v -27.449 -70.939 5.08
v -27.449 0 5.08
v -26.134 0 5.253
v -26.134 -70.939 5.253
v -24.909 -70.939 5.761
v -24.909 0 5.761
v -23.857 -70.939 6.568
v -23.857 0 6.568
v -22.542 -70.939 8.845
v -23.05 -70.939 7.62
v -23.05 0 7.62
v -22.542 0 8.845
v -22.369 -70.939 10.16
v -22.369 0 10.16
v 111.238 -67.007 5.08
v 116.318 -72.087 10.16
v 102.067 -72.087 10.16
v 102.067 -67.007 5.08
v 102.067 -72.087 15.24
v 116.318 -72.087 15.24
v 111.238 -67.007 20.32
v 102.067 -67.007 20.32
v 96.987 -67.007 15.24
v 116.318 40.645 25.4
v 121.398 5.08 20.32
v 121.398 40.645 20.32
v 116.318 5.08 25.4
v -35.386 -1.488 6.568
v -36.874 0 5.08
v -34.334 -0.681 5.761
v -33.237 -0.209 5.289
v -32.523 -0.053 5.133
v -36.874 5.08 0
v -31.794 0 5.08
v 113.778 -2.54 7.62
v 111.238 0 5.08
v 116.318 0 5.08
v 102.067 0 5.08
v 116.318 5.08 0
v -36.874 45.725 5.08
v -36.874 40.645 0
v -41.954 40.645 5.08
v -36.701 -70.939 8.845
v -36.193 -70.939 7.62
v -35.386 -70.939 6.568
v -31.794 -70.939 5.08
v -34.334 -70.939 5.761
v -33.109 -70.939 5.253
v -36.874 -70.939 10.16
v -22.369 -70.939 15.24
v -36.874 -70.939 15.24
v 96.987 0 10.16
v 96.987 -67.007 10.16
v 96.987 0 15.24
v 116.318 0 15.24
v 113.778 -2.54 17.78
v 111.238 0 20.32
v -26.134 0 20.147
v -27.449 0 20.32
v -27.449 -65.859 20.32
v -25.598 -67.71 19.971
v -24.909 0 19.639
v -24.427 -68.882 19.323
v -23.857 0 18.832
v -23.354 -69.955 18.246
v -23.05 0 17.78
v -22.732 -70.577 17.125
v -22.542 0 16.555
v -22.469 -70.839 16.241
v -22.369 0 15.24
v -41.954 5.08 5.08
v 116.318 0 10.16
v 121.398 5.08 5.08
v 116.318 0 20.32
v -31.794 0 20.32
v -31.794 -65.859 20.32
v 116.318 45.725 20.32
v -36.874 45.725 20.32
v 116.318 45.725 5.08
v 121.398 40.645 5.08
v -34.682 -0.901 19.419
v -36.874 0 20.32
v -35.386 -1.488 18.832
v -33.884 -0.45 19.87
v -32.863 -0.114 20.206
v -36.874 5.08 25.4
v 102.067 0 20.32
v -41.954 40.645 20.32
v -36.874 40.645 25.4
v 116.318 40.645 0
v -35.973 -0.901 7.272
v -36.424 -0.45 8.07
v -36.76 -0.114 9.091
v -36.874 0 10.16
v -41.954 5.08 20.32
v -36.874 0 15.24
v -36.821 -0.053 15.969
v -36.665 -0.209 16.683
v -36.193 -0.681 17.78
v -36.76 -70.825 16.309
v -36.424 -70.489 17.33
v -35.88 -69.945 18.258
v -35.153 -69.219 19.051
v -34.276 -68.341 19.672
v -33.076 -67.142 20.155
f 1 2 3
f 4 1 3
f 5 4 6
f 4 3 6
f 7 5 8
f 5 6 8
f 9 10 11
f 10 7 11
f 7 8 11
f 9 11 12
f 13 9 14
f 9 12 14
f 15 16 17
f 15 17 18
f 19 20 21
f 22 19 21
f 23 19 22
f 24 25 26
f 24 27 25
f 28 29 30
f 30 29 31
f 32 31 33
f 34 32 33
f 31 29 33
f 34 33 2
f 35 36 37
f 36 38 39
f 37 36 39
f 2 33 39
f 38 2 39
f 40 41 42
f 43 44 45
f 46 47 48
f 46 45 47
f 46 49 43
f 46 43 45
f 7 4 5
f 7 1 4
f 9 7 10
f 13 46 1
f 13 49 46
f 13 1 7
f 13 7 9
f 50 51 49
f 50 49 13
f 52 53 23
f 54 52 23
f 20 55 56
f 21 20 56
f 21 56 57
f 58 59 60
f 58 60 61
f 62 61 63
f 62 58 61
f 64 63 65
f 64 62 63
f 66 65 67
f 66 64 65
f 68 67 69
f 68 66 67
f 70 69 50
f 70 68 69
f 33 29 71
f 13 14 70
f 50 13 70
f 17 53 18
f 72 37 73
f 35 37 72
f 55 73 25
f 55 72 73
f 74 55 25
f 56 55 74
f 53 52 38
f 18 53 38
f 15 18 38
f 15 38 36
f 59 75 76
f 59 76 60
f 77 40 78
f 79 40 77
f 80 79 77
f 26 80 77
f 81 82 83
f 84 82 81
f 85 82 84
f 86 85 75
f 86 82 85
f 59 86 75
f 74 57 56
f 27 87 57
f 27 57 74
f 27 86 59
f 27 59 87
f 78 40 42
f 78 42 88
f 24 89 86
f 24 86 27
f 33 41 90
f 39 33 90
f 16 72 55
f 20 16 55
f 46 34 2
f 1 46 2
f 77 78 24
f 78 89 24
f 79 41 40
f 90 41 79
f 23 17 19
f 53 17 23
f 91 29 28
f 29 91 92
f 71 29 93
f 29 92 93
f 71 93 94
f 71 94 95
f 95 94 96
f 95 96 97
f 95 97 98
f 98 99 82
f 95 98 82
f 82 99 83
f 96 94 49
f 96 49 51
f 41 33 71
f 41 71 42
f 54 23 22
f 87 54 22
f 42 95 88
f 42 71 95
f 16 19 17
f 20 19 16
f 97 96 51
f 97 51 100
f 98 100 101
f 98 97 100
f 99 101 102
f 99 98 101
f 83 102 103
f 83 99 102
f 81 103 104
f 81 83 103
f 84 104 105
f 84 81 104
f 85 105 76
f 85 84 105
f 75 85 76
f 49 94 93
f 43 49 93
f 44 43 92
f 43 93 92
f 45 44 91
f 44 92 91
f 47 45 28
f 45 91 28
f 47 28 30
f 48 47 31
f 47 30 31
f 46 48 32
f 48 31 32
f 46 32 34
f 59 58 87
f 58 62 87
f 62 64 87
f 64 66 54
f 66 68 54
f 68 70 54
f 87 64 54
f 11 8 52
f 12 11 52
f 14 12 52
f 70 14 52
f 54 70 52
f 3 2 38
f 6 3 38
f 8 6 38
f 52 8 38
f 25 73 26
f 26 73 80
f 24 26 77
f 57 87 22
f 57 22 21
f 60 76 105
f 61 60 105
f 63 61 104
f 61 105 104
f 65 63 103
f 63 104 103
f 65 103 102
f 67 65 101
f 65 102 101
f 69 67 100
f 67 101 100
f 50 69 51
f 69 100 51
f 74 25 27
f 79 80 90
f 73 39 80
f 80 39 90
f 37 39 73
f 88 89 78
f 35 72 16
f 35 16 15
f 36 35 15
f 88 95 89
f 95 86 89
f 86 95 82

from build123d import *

# Parameters (mm, degrees)
F0_W         = 163.3519083261
F0_H         = 45.7251667976
F1_DEPTH     = 25.4
F2_SIZE      = 5.08
F3_W         = 14.5046669376
F3_H         = 15.24
F4_DEPTH     = 70.9391236305
F5_W         = 19.3313653898
F5_H         = 15.24
F6_DEPTH     = 72.0867142081
F7_T1_DEPTH  = 39.9046669376
F7_T6_DEPTH  = 96.3391236305
F7_T12_DEPTH = 96.3391236305
F7_T18_DEPTH = 96.3391236305
F7_T24_DEPTH = 83.6391236305
F7_T29_DEPTH = 83.6391236305
F7_T34_DEPTH = 83.6391236305
F7_T39_DEPTH = 83.6391236305
F7_T44_DEPTH = 96.3391236305
F7_T50_DEPTH = 96.3391236305
F7_T56_DEPTH = 96.3391236305
F8_T1_DEPTH  = 6.4524666085
F8_T3_DEPTH  = 6.4524666085
F8_T5_DEPTH  = 85.150863787
F8_T7_DEPTH  = 45.4596645476
F8_T9_DEPTH  = 41.3682991577
F8_T14_DEPTH = 98.2150133659
F8_T19_DEPTH = 98.2150133659
F8_T24_DEPTH = 98.2150133659
F8_T29_DEPTH = 98.2150133659


# Not quite as in the source:
# - a fillet or chamfer that OpenCascade refuses, or shapes differently, is made with other operations: its cross-section is extruded or revolved along the edge and cut away or added


with BuildPart() as f1:
    # F0 (on Top) → F1 (new body)
    with BuildSketch(Plane.XY):
        with Locations((39.7221744061, 22.8625833988)):
            Rectangle(F0_W, F0_H)
    extrude(amount=F1_DEPTH)

    # F2
    f2_edges = [f1.edges().sort_by_distance(p)[0] for p in [
        (121.398129, 22.862583, 25.4),
        (121.398129, 22.862583, 0),
        (39.722174, 0, 0),
        (121.398129, 0, 12.7),
        (121.398129, 45.725167, 12.7),
        (39.722174, 45.725167, 0),
        (39.722174, 45.725167, 25.4),
        (-41.95378, 22.862583, 25.4),
        (-41.95378, 0, 12.7),
        (-41.95378, 22.862583, 0),
        (-41.95378, 45.725167, 12.7),
        (39.722174, 0, 25.4),
    ]]
    chamfer(f2_edges, length=F2_SIZE)

    # F3 (on face) → F4 (join)
    with BuildSketch(Plane.XZ):
        with Locations((-29.6214462882, 12.7)):
            Rectangle(F3_W, F3_H)
    extrude(amount=F4_DEPTH)

    # F5 (on face) → F6 (join)
    with BuildSketch(Plane.XZ):
        with Locations((106.6524458742, 12.7)):
            Rectangle(F5_W, F5_H)
    extrude(amount=F6_DEPTH)

    # F7: fillet of radius 5.08 on 5 edges, made by hand

    # F7_s2 → F7_t1 (cut)
    with BuildSketch(Plane.YZ.offset(-49.573779757)):
        with BuildLine():
            ThreePointArc((-65.8591236305, 20.32), (-69.451226079, 18.8321024484), (-70.9391236305, 15.24))
            Line((-70.9391236305, 15.24), (-70.9391236305, 20.32))
            Line((-70.9391236305, 20.32), (-65.8591236305, 20.32))
        make_face()
    extrude(amount=F7_T1_DEPTH, mode=Mode.SUBTRACT)


with BuildPart() as f7_tool4:
    # F7_s5 → F7_t6 (new body)
    with BuildSketch(Plane.XZ.offset(-12.7)):
        with BuildLine():
            ThreePointArc((-36.873779757, 15.24), (-35.3858822055, 18.8321024484), (-31.793779757, 20.32))
            Line((-31.793779757, 20.32), (-36.873779757, 20.32))
            Line((-36.873779757, 20.32), (-36.873779757, 15.24))
        make_face()
    extrude(amount=F7_T6_DEPTH)

    split(bisect_by=Plane(origin=(-18.4368898785, -18.4368898785, 0), x_dir=(0, 0, 1), z_dir=(0.7071067812, 0.7071067812, 0)), keep=Keep.TOP)

    split(bisect_by=Plane(origin=(0, -10.16, 10.16), x_dir=(1, 0, 0), z_dir=(0, -0.7071067812, 0.7071067812)), keep=Keep.TOP)


with BuildPart() as f1_1:
    add(f1.part)

    # F7_t3: cut F7_tool4
    add(f7_tool4.part, mode=Mode.SUBTRACT)


with BuildPart() as f7_tool10:
    # F7_s11 → F7_t12 (new body)
    with BuildSketch(Plane.XZ.offset(-12.7)):
        with BuildLine():
            ThreePointArc((-36.873779757, 15.24), (-35.3858822055, 18.8321024484), (-31.793779757, 20.32))
            Line((-31.793779757, 20.32), (-36.873779757, 20.32))
            Line((-36.873779757, 20.32), (-36.873779757, 15.24))
        make_face()
    extrude(amount=F7_T12_DEPTH)

    split(bisect_by=Plane(origin=(-18.4368898785, -18.4368898785, 0), x_dir=(0, 0, 1), z_dir=(-0.7071067812, -0.7071067812, 0)), keep=Keep.TOP)

    split(bisect_by=Plane(origin=(0, -10.16, 10.16), x_dir=(1, 0, 0), z_dir=(0, 0.7071067812, -0.7071067812)), keep=Keep.TOP)


with BuildPart() as f1_2:
    add(f1_1.part)

    # F7_t9: cut F7_tool10
    add(f7_tool10.part, mode=Mode.SUBTRACT)


with BuildPart() as f7_tool16:
    # F7_s17 → F7_t18 (new body)
    with BuildSketch(Plane.XZ.offset(-12.7)):
        with BuildLine():
            ThreePointArc((-36.873779757, 15.24), (-35.3858822055, 18.8321024484), (-31.793779757, 20.32))
            Line((-31.793779757, 20.32), (-36.873779757, 20.32))
            Line((-36.873779757, 20.32), (-36.873779757, 15.24))
        make_face()
    extrude(amount=F7_T18_DEPTH)

    split(bisect_by=Plane(origin=(-18.4368898785, -18.4368898785, 0), x_dir=(0, 0, 1), z_dir=(-0.7071067812, -0.7071067812, 0)), keep=Keep.TOP)

    split(bisect_by=Plane(origin=(0, -10.16, 10.16), x_dir=(1, 0, 0), z_dir=(0, -0.7071067812, 0.7071067812)), keep=Keep.TOP)


with BuildPart() as f1_3:
    add(f1_2.part)

    # F7_t15: cut F7_tool16
    add(f7_tool16.part, mode=Mode.SUBTRACT)


with BuildPart() as f7_tool22:
    # F7_s23 → F7_t24 (new body)
    with BuildSketch(Plane.XZ):
        with BuildLine():
            ThreePointArc((-27.4491128194, 5.08), (-23.857010371, 6.5678975516), (-22.3691128194, 10.16))
            Line((-22.3691128194, 10.16), (-22.3691128194, 5.08))
            Line((-22.3691128194, 5.08), (-27.4491128194, 5.08))
        make_face()
    extrude(amount=F7_T24_DEPTH)

    split(bisect_by=Plane(origin=(0, 2.54, 2.54), x_dir=(1, 0, 0), z_dir=(0, 0.7071067812, 0.7071067812)), keep=Keep.TOP)


with BuildPart() as f1_4:
    add(f1_3.part)

    # F7_t21: cut F7_tool22
    add(f7_tool22.part, mode=Mode.SUBTRACT)


with BuildPart() as f7_tool27:
    # F7_s28 → F7_t29 (new body)
    with BuildSketch(Plane.XZ):
        with BuildLine():
            ThreePointArc((-27.4491128194, 5.08), (-23.857010371, 6.5678975516), (-22.3691128194, 10.16))
            Line((-22.3691128194, 10.16), (-22.3691128194, 5.08))
            Line((-22.3691128194, 5.08), (-27.4491128194, 5.08))
        make_face()
    extrude(amount=F7_T29_DEPTH)

    split(bisect_by=Plane(origin=(0, 2.54, 2.54), x_dir=(1, 0, 0), z_dir=(0, -0.7071067812, -0.7071067812)), keep=Keep.TOP)


with BuildPart() as f1_5:
    add(f1_4.part)

    # F7_t26: cut F7_tool27
    add(f7_tool27.part, mode=Mode.SUBTRACT)


with BuildPart() as f7_tool32:
    # F7_s33 → F7_t34 (new body)
    with BuildSketch(Plane.XZ):
        with BuildLine():
            ThreePointArc((-27.4491128194, 20.32), (-23.857010371, 18.8321024484), (-22.3691128194, 15.24))
            Line((-22.3691128194, 15.24), (-22.3691128194, 20.32))
            Line((-22.3691128194, 20.32), (-27.4491128194, 20.32))
        make_face()
    extrude(amount=F7_T34_DEPTH)

    split(bisect_by=Plane(origin=(0, -10.16, 10.16), x_dir=(1, 0, 0), z_dir=(0, 0.7071067812, -0.7071067812)), keep=Keep.TOP)


with BuildPart() as f1_6:
    add(f1_5.part)

    # F7_t31: cut F7_tool32
    add(f7_tool32.part, mode=Mode.SUBTRACT)


with BuildPart() as f7_tool37:
    # F7_s38 → F7_t39 (new body)
    with BuildSketch(Plane.XZ):
        with BuildLine():
            ThreePointArc((-27.4491128194, 20.32), (-23.857010371, 18.8321024484), (-22.3691128194, 15.24))
            Line((-22.3691128194, 15.24), (-22.3691128194, 20.32))
            Line((-22.3691128194, 20.32), (-27.4491128194, 20.32))
        make_face()
    extrude(amount=F7_T39_DEPTH)

    split(bisect_by=Plane(origin=(0, -10.16, 10.16), x_dir=(1, 0, 0), z_dir=(0, -0.7071067812, 0.7071067812)), keep=Keep.TOP)


with BuildPart() as f1_7:
    add(f1_6.part)

    # F7_t36: cut F7_tool37
    add(f7_tool37.part, mode=Mode.SUBTRACT)


with BuildPart() as f7_tool42:
    # F7_s43 → F7_t44 (new body)
    with BuildSketch(Plane.XZ.offset(-12.7)):
        with BuildLine():
            ThreePointArc((-36.873779757, 10.16), (-35.3858822055, 6.5678975516), (-31.793779757, 5.08))
            Line((-31.793779757, 5.08), (-36.873779757, 5.08))
            Line((-36.873779757, 5.08), (-36.873779757, 10.16))
        make_face()
    extrude(amount=F7_T44_DEPTH)

    split(bisect_by=Plane(origin=(-18.4368898785, -18.4368898785, 0), x_dir=(0, 0, 1), z_dir=(0.7071067812, 0.7071067812, 0)), keep=Keep.TOP)

    split(bisect_by=Plane(origin=(0, 2.54, 2.54), x_dir=(1, 0, 0), z_dir=(0, -0.7071067812, -0.7071067812)), keep=Keep.TOP)


with BuildPart() as f1_8:
    add(f1_7.part)

    # F7_t41: cut F7_tool42
    add(f7_tool42.part, mode=Mode.SUBTRACT)


with BuildPart() as f7_tool48:
    # F7_s49 → F7_t50 (new body)
    with BuildSketch(Plane.XZ.offset(-12.7)):
        with BuildLine():
            ThreePointArc((-36.873779757, 10.16), (-35.3858822055, 6.5678975516), (-31.793779757, 5.08))
            Line((-31.793779757, 5.08), (-36.873779757, 5.08))
            Line((-36.873779757, 5.08), (-36.873779757, 10.16))
        make_face()
    extrude(amount=F7_T50_DEPTH)

    split(bisect_by=Plane(origin=(-18.4368898785, -18.4368898785, 0), x_dir=(0, 0, 1), z_dir=(-0.7071067812, -0.7071067812, 0)), keep=Keep.TOP)

    split(bisect_by=Plane(origin=(0, 2.54, 2.54), x_dir=(1, 0, 0), z_dir=(0, 0.7071067812, 0.7071067812)), keep=Keep.TOP)


with BuildPart() as f1_9:
    add(f1_8.part)

    # F7_t47: cut F7_tool48
    add(f7_tool48.part, mode=Mode.SUBTRACT)


with BuildPart() as f7_tool54:
    # F7_s55 → F7_t56 (new body)
    with BuildSketch(Plane.XZ.offset(-12.7)):
        with BuildLine():
            ThreePointArc((-36.873779757, 10.16), (-35.3858822055, 6.5678975516), (-31.793779757, 5.08))
            Line((-31.793779757, 5.08), (-36.873779757, 5.08))
            Line((-36.873779757, 5.08), (-36.873779757, 10.16))
        make_face()
    extrude(amount=F7_T56_DEPTH)

    split(bisect_by=Plane(origin=(-18.4368898785, -18.4368898785, 0), x_dir=(0, 0, 1), z_dir=(-0.7071067812, -0.7071067812, 0)), keep=Keep.TOP)

    split(bisect_by=Plane(origin=(0, 2.54, 2.54), x_dir=(1, 0, 0), z_dir=(0, -0.7071067812, -0.7071067812)), keep=Keep.TOP)


with BuildPart() as f1_10:
    add(f1_9.part)

    # F7_t53: cut F7_tool54
    add(f7_tool54.part, mode=Mode.SUBTRACT)

    # F8: chamfer of 5.08 on 7 edges, made by hand

    # F8_s2 → F8_t1 (cut)
    with BuildSketch(Plane(origin=(4.9133496571, 4.9133496571, -4.9133496571), x_dir=(0.7071067812, -0.7071067812, 0), z_dir=(-0.5773502692, -0.5773502692, 0.5773502692))):
        Polygon((119.5530023794, 30.9044155805), (123.1451048279, 24.6827116338), (115.960899931, 24.6827116338), align=None)
    extrude(amount=F8_T1_DEPTH, mode=Mode.SUBTRACT)

    # F8_s4 → F8_t3 (cut)
    with BuildSketch(Plane(origin=(13.3800163237, 13.3800163237, 13.3800163237), x_dir=(0.7071067812, -0.7071067812, 0), z_dir=(-0.5773502692, -0.5773502692, -0.5773502692))):
        Polygon((119.5530023794, -10.1654024249), (123.1451048279, -3.9436984783), (115.960899931, -3.9436984783), align=None)
    extrude(amount=F8_T3_DEPTH, mode=Mode.SUBTRACT)

    # F8_s6 → F8_t5 (cut)
    with BuildSketch(Plane.XZ):
        Polygon((96.9867631793, 15.24), (102.0667631793, 20.32), (96.9867631793, 20.32), align=None)
        Polygon((96.9867631793, 10.16), (102.0667631793, 5.08), (96.9867631793, 5.08), align=None)
    extrude(amount=F8_T5_DEPTH, mode=Mode.SUBTRACT)

    # F8_s8 → F8_t7 (cut)
    with BuildSketch(Plane.YZ.offset(83.9226136004)):
        Polygon((-72.0867142081, 15.24), (-67.0067142081, 20.32), (-72.0867142081, 20.32), align=None)
        Polygon((-72.0867142081, 10.16), (-67.0067142081, 5.08), (-72.0867142081, 5.08), align=None)
    extrude(amount=F8_T7_DEPTH, mode=Mode.SUBTRACT)

    # F8_s10 → F8_t9 (cut)
    with BuildSketch(Plane.XY.offset(-7.9841495789)):
        Polygon((102.0667631793, -72.0867142081), (96.9867631793, -67.0067142081), (96.9867631793, -72.0867142081), align=None)
    extrude(amount=F8_T9_DEPTH, mode=Mode.SUBTRACT)


with BuildPart() as f8_tool12:
    # F8_s13 → F8_t14 (new body)
    with BuildSketch(Plane.XZ.offset(-13.0641495789)):
        Polygon((116.3181285691, 15.24), (111.2381285691, 20.32), (116.3181285691, 20.32), align=None)
    extrude(amount=F8_T14_DEPTH)

    split(bisect_by=Plane(origin=(0, -10.16, 10.16), x_dir=(1, 0, 0), z_dir=(0, -0.7071067812, 0.7071067812)), keep=Keep.TOP)


with BuildPart() as f1_11:
    add(f1_10.part)

    # F8_t11: cut F8_tool12
    add(f8_tool12.part, mode=Mode.SUBTRACT)


with BuildPart() as f8_tool17:
    # F8_s18 → F8_t19 (new body)
    with BuildSketch(Plane.XZ.offset(-13.0641495789)):
        Polygon((116.3181285691, 15.24), (111.2381285691, 20.32), (116.3181285691, 20.32), align=None)
    extrude(amount=F8_T19_DEPTH)

    split(bisect_by=Plane(origin=(58.1590642846, -58.1590642846, 0), x_dir=(0, 0, 1), z_dir=(0.7071067812, -0.7071067812, 0)), keep=Keep.TOP)


with BuildPart() as f1_12:
    add(f1_11.part)

    # F8_t16: cut F8_tool17
    add(f8_tool17.part, mode=Mode.SUBTRACT)


with BuildPart() as f8_tool22:
    # F8_s23 → F8_t24 (new body)
    with BuildSketch(Plane.XZ.offset(-13.0641495789)):
        Polygon((116.3181285691, 10.16), (111.2381285691, 5.08), (116.3181285691, 5.08), align=None)
    extrude(amount=F8_T24_DEPTH)

    split(bisect_by=Plane(origin=(0, 2.54, 2.54), x_dir=(1, 0, 0), z_dir=(0, -0.7071067812, -0.7071067812)), keep=Keep.TOP)


with BuildPart() as f1_13:
    add(f1_12.part)

    # F8_t21: cut F8_tool22
    add(f8_tool22.part, mode=Mode.SUBTRACT)


with BuildPart() as f8_tool27:
    # F8_s28 → F8_t29 (new body)
    with BuildSketch(Plane.XZ.offset(-13.0641495789)):
        Polygon((116.3181285691, 10.16), (111.2381285691, 5.08), (116.3181285691, 5.08), align=None)
    extrude(amount=F8_T29_DEPTH)

    split(bisect_by=Plane(origin=(58.1590642846, -58.1590642846, 0), x_dir=(0, 0, 1), z_dir=(0.7071067812, -0.7071067812, 0)), keep=Keep.TOP)


with BuildPart() as f1_14:
    add(f1_13.part)

    # F8_t26: cut F8_tool27
    add(f8_tool27.part, mode=Mode.SUBTRACT)


solid = f1_14.part
